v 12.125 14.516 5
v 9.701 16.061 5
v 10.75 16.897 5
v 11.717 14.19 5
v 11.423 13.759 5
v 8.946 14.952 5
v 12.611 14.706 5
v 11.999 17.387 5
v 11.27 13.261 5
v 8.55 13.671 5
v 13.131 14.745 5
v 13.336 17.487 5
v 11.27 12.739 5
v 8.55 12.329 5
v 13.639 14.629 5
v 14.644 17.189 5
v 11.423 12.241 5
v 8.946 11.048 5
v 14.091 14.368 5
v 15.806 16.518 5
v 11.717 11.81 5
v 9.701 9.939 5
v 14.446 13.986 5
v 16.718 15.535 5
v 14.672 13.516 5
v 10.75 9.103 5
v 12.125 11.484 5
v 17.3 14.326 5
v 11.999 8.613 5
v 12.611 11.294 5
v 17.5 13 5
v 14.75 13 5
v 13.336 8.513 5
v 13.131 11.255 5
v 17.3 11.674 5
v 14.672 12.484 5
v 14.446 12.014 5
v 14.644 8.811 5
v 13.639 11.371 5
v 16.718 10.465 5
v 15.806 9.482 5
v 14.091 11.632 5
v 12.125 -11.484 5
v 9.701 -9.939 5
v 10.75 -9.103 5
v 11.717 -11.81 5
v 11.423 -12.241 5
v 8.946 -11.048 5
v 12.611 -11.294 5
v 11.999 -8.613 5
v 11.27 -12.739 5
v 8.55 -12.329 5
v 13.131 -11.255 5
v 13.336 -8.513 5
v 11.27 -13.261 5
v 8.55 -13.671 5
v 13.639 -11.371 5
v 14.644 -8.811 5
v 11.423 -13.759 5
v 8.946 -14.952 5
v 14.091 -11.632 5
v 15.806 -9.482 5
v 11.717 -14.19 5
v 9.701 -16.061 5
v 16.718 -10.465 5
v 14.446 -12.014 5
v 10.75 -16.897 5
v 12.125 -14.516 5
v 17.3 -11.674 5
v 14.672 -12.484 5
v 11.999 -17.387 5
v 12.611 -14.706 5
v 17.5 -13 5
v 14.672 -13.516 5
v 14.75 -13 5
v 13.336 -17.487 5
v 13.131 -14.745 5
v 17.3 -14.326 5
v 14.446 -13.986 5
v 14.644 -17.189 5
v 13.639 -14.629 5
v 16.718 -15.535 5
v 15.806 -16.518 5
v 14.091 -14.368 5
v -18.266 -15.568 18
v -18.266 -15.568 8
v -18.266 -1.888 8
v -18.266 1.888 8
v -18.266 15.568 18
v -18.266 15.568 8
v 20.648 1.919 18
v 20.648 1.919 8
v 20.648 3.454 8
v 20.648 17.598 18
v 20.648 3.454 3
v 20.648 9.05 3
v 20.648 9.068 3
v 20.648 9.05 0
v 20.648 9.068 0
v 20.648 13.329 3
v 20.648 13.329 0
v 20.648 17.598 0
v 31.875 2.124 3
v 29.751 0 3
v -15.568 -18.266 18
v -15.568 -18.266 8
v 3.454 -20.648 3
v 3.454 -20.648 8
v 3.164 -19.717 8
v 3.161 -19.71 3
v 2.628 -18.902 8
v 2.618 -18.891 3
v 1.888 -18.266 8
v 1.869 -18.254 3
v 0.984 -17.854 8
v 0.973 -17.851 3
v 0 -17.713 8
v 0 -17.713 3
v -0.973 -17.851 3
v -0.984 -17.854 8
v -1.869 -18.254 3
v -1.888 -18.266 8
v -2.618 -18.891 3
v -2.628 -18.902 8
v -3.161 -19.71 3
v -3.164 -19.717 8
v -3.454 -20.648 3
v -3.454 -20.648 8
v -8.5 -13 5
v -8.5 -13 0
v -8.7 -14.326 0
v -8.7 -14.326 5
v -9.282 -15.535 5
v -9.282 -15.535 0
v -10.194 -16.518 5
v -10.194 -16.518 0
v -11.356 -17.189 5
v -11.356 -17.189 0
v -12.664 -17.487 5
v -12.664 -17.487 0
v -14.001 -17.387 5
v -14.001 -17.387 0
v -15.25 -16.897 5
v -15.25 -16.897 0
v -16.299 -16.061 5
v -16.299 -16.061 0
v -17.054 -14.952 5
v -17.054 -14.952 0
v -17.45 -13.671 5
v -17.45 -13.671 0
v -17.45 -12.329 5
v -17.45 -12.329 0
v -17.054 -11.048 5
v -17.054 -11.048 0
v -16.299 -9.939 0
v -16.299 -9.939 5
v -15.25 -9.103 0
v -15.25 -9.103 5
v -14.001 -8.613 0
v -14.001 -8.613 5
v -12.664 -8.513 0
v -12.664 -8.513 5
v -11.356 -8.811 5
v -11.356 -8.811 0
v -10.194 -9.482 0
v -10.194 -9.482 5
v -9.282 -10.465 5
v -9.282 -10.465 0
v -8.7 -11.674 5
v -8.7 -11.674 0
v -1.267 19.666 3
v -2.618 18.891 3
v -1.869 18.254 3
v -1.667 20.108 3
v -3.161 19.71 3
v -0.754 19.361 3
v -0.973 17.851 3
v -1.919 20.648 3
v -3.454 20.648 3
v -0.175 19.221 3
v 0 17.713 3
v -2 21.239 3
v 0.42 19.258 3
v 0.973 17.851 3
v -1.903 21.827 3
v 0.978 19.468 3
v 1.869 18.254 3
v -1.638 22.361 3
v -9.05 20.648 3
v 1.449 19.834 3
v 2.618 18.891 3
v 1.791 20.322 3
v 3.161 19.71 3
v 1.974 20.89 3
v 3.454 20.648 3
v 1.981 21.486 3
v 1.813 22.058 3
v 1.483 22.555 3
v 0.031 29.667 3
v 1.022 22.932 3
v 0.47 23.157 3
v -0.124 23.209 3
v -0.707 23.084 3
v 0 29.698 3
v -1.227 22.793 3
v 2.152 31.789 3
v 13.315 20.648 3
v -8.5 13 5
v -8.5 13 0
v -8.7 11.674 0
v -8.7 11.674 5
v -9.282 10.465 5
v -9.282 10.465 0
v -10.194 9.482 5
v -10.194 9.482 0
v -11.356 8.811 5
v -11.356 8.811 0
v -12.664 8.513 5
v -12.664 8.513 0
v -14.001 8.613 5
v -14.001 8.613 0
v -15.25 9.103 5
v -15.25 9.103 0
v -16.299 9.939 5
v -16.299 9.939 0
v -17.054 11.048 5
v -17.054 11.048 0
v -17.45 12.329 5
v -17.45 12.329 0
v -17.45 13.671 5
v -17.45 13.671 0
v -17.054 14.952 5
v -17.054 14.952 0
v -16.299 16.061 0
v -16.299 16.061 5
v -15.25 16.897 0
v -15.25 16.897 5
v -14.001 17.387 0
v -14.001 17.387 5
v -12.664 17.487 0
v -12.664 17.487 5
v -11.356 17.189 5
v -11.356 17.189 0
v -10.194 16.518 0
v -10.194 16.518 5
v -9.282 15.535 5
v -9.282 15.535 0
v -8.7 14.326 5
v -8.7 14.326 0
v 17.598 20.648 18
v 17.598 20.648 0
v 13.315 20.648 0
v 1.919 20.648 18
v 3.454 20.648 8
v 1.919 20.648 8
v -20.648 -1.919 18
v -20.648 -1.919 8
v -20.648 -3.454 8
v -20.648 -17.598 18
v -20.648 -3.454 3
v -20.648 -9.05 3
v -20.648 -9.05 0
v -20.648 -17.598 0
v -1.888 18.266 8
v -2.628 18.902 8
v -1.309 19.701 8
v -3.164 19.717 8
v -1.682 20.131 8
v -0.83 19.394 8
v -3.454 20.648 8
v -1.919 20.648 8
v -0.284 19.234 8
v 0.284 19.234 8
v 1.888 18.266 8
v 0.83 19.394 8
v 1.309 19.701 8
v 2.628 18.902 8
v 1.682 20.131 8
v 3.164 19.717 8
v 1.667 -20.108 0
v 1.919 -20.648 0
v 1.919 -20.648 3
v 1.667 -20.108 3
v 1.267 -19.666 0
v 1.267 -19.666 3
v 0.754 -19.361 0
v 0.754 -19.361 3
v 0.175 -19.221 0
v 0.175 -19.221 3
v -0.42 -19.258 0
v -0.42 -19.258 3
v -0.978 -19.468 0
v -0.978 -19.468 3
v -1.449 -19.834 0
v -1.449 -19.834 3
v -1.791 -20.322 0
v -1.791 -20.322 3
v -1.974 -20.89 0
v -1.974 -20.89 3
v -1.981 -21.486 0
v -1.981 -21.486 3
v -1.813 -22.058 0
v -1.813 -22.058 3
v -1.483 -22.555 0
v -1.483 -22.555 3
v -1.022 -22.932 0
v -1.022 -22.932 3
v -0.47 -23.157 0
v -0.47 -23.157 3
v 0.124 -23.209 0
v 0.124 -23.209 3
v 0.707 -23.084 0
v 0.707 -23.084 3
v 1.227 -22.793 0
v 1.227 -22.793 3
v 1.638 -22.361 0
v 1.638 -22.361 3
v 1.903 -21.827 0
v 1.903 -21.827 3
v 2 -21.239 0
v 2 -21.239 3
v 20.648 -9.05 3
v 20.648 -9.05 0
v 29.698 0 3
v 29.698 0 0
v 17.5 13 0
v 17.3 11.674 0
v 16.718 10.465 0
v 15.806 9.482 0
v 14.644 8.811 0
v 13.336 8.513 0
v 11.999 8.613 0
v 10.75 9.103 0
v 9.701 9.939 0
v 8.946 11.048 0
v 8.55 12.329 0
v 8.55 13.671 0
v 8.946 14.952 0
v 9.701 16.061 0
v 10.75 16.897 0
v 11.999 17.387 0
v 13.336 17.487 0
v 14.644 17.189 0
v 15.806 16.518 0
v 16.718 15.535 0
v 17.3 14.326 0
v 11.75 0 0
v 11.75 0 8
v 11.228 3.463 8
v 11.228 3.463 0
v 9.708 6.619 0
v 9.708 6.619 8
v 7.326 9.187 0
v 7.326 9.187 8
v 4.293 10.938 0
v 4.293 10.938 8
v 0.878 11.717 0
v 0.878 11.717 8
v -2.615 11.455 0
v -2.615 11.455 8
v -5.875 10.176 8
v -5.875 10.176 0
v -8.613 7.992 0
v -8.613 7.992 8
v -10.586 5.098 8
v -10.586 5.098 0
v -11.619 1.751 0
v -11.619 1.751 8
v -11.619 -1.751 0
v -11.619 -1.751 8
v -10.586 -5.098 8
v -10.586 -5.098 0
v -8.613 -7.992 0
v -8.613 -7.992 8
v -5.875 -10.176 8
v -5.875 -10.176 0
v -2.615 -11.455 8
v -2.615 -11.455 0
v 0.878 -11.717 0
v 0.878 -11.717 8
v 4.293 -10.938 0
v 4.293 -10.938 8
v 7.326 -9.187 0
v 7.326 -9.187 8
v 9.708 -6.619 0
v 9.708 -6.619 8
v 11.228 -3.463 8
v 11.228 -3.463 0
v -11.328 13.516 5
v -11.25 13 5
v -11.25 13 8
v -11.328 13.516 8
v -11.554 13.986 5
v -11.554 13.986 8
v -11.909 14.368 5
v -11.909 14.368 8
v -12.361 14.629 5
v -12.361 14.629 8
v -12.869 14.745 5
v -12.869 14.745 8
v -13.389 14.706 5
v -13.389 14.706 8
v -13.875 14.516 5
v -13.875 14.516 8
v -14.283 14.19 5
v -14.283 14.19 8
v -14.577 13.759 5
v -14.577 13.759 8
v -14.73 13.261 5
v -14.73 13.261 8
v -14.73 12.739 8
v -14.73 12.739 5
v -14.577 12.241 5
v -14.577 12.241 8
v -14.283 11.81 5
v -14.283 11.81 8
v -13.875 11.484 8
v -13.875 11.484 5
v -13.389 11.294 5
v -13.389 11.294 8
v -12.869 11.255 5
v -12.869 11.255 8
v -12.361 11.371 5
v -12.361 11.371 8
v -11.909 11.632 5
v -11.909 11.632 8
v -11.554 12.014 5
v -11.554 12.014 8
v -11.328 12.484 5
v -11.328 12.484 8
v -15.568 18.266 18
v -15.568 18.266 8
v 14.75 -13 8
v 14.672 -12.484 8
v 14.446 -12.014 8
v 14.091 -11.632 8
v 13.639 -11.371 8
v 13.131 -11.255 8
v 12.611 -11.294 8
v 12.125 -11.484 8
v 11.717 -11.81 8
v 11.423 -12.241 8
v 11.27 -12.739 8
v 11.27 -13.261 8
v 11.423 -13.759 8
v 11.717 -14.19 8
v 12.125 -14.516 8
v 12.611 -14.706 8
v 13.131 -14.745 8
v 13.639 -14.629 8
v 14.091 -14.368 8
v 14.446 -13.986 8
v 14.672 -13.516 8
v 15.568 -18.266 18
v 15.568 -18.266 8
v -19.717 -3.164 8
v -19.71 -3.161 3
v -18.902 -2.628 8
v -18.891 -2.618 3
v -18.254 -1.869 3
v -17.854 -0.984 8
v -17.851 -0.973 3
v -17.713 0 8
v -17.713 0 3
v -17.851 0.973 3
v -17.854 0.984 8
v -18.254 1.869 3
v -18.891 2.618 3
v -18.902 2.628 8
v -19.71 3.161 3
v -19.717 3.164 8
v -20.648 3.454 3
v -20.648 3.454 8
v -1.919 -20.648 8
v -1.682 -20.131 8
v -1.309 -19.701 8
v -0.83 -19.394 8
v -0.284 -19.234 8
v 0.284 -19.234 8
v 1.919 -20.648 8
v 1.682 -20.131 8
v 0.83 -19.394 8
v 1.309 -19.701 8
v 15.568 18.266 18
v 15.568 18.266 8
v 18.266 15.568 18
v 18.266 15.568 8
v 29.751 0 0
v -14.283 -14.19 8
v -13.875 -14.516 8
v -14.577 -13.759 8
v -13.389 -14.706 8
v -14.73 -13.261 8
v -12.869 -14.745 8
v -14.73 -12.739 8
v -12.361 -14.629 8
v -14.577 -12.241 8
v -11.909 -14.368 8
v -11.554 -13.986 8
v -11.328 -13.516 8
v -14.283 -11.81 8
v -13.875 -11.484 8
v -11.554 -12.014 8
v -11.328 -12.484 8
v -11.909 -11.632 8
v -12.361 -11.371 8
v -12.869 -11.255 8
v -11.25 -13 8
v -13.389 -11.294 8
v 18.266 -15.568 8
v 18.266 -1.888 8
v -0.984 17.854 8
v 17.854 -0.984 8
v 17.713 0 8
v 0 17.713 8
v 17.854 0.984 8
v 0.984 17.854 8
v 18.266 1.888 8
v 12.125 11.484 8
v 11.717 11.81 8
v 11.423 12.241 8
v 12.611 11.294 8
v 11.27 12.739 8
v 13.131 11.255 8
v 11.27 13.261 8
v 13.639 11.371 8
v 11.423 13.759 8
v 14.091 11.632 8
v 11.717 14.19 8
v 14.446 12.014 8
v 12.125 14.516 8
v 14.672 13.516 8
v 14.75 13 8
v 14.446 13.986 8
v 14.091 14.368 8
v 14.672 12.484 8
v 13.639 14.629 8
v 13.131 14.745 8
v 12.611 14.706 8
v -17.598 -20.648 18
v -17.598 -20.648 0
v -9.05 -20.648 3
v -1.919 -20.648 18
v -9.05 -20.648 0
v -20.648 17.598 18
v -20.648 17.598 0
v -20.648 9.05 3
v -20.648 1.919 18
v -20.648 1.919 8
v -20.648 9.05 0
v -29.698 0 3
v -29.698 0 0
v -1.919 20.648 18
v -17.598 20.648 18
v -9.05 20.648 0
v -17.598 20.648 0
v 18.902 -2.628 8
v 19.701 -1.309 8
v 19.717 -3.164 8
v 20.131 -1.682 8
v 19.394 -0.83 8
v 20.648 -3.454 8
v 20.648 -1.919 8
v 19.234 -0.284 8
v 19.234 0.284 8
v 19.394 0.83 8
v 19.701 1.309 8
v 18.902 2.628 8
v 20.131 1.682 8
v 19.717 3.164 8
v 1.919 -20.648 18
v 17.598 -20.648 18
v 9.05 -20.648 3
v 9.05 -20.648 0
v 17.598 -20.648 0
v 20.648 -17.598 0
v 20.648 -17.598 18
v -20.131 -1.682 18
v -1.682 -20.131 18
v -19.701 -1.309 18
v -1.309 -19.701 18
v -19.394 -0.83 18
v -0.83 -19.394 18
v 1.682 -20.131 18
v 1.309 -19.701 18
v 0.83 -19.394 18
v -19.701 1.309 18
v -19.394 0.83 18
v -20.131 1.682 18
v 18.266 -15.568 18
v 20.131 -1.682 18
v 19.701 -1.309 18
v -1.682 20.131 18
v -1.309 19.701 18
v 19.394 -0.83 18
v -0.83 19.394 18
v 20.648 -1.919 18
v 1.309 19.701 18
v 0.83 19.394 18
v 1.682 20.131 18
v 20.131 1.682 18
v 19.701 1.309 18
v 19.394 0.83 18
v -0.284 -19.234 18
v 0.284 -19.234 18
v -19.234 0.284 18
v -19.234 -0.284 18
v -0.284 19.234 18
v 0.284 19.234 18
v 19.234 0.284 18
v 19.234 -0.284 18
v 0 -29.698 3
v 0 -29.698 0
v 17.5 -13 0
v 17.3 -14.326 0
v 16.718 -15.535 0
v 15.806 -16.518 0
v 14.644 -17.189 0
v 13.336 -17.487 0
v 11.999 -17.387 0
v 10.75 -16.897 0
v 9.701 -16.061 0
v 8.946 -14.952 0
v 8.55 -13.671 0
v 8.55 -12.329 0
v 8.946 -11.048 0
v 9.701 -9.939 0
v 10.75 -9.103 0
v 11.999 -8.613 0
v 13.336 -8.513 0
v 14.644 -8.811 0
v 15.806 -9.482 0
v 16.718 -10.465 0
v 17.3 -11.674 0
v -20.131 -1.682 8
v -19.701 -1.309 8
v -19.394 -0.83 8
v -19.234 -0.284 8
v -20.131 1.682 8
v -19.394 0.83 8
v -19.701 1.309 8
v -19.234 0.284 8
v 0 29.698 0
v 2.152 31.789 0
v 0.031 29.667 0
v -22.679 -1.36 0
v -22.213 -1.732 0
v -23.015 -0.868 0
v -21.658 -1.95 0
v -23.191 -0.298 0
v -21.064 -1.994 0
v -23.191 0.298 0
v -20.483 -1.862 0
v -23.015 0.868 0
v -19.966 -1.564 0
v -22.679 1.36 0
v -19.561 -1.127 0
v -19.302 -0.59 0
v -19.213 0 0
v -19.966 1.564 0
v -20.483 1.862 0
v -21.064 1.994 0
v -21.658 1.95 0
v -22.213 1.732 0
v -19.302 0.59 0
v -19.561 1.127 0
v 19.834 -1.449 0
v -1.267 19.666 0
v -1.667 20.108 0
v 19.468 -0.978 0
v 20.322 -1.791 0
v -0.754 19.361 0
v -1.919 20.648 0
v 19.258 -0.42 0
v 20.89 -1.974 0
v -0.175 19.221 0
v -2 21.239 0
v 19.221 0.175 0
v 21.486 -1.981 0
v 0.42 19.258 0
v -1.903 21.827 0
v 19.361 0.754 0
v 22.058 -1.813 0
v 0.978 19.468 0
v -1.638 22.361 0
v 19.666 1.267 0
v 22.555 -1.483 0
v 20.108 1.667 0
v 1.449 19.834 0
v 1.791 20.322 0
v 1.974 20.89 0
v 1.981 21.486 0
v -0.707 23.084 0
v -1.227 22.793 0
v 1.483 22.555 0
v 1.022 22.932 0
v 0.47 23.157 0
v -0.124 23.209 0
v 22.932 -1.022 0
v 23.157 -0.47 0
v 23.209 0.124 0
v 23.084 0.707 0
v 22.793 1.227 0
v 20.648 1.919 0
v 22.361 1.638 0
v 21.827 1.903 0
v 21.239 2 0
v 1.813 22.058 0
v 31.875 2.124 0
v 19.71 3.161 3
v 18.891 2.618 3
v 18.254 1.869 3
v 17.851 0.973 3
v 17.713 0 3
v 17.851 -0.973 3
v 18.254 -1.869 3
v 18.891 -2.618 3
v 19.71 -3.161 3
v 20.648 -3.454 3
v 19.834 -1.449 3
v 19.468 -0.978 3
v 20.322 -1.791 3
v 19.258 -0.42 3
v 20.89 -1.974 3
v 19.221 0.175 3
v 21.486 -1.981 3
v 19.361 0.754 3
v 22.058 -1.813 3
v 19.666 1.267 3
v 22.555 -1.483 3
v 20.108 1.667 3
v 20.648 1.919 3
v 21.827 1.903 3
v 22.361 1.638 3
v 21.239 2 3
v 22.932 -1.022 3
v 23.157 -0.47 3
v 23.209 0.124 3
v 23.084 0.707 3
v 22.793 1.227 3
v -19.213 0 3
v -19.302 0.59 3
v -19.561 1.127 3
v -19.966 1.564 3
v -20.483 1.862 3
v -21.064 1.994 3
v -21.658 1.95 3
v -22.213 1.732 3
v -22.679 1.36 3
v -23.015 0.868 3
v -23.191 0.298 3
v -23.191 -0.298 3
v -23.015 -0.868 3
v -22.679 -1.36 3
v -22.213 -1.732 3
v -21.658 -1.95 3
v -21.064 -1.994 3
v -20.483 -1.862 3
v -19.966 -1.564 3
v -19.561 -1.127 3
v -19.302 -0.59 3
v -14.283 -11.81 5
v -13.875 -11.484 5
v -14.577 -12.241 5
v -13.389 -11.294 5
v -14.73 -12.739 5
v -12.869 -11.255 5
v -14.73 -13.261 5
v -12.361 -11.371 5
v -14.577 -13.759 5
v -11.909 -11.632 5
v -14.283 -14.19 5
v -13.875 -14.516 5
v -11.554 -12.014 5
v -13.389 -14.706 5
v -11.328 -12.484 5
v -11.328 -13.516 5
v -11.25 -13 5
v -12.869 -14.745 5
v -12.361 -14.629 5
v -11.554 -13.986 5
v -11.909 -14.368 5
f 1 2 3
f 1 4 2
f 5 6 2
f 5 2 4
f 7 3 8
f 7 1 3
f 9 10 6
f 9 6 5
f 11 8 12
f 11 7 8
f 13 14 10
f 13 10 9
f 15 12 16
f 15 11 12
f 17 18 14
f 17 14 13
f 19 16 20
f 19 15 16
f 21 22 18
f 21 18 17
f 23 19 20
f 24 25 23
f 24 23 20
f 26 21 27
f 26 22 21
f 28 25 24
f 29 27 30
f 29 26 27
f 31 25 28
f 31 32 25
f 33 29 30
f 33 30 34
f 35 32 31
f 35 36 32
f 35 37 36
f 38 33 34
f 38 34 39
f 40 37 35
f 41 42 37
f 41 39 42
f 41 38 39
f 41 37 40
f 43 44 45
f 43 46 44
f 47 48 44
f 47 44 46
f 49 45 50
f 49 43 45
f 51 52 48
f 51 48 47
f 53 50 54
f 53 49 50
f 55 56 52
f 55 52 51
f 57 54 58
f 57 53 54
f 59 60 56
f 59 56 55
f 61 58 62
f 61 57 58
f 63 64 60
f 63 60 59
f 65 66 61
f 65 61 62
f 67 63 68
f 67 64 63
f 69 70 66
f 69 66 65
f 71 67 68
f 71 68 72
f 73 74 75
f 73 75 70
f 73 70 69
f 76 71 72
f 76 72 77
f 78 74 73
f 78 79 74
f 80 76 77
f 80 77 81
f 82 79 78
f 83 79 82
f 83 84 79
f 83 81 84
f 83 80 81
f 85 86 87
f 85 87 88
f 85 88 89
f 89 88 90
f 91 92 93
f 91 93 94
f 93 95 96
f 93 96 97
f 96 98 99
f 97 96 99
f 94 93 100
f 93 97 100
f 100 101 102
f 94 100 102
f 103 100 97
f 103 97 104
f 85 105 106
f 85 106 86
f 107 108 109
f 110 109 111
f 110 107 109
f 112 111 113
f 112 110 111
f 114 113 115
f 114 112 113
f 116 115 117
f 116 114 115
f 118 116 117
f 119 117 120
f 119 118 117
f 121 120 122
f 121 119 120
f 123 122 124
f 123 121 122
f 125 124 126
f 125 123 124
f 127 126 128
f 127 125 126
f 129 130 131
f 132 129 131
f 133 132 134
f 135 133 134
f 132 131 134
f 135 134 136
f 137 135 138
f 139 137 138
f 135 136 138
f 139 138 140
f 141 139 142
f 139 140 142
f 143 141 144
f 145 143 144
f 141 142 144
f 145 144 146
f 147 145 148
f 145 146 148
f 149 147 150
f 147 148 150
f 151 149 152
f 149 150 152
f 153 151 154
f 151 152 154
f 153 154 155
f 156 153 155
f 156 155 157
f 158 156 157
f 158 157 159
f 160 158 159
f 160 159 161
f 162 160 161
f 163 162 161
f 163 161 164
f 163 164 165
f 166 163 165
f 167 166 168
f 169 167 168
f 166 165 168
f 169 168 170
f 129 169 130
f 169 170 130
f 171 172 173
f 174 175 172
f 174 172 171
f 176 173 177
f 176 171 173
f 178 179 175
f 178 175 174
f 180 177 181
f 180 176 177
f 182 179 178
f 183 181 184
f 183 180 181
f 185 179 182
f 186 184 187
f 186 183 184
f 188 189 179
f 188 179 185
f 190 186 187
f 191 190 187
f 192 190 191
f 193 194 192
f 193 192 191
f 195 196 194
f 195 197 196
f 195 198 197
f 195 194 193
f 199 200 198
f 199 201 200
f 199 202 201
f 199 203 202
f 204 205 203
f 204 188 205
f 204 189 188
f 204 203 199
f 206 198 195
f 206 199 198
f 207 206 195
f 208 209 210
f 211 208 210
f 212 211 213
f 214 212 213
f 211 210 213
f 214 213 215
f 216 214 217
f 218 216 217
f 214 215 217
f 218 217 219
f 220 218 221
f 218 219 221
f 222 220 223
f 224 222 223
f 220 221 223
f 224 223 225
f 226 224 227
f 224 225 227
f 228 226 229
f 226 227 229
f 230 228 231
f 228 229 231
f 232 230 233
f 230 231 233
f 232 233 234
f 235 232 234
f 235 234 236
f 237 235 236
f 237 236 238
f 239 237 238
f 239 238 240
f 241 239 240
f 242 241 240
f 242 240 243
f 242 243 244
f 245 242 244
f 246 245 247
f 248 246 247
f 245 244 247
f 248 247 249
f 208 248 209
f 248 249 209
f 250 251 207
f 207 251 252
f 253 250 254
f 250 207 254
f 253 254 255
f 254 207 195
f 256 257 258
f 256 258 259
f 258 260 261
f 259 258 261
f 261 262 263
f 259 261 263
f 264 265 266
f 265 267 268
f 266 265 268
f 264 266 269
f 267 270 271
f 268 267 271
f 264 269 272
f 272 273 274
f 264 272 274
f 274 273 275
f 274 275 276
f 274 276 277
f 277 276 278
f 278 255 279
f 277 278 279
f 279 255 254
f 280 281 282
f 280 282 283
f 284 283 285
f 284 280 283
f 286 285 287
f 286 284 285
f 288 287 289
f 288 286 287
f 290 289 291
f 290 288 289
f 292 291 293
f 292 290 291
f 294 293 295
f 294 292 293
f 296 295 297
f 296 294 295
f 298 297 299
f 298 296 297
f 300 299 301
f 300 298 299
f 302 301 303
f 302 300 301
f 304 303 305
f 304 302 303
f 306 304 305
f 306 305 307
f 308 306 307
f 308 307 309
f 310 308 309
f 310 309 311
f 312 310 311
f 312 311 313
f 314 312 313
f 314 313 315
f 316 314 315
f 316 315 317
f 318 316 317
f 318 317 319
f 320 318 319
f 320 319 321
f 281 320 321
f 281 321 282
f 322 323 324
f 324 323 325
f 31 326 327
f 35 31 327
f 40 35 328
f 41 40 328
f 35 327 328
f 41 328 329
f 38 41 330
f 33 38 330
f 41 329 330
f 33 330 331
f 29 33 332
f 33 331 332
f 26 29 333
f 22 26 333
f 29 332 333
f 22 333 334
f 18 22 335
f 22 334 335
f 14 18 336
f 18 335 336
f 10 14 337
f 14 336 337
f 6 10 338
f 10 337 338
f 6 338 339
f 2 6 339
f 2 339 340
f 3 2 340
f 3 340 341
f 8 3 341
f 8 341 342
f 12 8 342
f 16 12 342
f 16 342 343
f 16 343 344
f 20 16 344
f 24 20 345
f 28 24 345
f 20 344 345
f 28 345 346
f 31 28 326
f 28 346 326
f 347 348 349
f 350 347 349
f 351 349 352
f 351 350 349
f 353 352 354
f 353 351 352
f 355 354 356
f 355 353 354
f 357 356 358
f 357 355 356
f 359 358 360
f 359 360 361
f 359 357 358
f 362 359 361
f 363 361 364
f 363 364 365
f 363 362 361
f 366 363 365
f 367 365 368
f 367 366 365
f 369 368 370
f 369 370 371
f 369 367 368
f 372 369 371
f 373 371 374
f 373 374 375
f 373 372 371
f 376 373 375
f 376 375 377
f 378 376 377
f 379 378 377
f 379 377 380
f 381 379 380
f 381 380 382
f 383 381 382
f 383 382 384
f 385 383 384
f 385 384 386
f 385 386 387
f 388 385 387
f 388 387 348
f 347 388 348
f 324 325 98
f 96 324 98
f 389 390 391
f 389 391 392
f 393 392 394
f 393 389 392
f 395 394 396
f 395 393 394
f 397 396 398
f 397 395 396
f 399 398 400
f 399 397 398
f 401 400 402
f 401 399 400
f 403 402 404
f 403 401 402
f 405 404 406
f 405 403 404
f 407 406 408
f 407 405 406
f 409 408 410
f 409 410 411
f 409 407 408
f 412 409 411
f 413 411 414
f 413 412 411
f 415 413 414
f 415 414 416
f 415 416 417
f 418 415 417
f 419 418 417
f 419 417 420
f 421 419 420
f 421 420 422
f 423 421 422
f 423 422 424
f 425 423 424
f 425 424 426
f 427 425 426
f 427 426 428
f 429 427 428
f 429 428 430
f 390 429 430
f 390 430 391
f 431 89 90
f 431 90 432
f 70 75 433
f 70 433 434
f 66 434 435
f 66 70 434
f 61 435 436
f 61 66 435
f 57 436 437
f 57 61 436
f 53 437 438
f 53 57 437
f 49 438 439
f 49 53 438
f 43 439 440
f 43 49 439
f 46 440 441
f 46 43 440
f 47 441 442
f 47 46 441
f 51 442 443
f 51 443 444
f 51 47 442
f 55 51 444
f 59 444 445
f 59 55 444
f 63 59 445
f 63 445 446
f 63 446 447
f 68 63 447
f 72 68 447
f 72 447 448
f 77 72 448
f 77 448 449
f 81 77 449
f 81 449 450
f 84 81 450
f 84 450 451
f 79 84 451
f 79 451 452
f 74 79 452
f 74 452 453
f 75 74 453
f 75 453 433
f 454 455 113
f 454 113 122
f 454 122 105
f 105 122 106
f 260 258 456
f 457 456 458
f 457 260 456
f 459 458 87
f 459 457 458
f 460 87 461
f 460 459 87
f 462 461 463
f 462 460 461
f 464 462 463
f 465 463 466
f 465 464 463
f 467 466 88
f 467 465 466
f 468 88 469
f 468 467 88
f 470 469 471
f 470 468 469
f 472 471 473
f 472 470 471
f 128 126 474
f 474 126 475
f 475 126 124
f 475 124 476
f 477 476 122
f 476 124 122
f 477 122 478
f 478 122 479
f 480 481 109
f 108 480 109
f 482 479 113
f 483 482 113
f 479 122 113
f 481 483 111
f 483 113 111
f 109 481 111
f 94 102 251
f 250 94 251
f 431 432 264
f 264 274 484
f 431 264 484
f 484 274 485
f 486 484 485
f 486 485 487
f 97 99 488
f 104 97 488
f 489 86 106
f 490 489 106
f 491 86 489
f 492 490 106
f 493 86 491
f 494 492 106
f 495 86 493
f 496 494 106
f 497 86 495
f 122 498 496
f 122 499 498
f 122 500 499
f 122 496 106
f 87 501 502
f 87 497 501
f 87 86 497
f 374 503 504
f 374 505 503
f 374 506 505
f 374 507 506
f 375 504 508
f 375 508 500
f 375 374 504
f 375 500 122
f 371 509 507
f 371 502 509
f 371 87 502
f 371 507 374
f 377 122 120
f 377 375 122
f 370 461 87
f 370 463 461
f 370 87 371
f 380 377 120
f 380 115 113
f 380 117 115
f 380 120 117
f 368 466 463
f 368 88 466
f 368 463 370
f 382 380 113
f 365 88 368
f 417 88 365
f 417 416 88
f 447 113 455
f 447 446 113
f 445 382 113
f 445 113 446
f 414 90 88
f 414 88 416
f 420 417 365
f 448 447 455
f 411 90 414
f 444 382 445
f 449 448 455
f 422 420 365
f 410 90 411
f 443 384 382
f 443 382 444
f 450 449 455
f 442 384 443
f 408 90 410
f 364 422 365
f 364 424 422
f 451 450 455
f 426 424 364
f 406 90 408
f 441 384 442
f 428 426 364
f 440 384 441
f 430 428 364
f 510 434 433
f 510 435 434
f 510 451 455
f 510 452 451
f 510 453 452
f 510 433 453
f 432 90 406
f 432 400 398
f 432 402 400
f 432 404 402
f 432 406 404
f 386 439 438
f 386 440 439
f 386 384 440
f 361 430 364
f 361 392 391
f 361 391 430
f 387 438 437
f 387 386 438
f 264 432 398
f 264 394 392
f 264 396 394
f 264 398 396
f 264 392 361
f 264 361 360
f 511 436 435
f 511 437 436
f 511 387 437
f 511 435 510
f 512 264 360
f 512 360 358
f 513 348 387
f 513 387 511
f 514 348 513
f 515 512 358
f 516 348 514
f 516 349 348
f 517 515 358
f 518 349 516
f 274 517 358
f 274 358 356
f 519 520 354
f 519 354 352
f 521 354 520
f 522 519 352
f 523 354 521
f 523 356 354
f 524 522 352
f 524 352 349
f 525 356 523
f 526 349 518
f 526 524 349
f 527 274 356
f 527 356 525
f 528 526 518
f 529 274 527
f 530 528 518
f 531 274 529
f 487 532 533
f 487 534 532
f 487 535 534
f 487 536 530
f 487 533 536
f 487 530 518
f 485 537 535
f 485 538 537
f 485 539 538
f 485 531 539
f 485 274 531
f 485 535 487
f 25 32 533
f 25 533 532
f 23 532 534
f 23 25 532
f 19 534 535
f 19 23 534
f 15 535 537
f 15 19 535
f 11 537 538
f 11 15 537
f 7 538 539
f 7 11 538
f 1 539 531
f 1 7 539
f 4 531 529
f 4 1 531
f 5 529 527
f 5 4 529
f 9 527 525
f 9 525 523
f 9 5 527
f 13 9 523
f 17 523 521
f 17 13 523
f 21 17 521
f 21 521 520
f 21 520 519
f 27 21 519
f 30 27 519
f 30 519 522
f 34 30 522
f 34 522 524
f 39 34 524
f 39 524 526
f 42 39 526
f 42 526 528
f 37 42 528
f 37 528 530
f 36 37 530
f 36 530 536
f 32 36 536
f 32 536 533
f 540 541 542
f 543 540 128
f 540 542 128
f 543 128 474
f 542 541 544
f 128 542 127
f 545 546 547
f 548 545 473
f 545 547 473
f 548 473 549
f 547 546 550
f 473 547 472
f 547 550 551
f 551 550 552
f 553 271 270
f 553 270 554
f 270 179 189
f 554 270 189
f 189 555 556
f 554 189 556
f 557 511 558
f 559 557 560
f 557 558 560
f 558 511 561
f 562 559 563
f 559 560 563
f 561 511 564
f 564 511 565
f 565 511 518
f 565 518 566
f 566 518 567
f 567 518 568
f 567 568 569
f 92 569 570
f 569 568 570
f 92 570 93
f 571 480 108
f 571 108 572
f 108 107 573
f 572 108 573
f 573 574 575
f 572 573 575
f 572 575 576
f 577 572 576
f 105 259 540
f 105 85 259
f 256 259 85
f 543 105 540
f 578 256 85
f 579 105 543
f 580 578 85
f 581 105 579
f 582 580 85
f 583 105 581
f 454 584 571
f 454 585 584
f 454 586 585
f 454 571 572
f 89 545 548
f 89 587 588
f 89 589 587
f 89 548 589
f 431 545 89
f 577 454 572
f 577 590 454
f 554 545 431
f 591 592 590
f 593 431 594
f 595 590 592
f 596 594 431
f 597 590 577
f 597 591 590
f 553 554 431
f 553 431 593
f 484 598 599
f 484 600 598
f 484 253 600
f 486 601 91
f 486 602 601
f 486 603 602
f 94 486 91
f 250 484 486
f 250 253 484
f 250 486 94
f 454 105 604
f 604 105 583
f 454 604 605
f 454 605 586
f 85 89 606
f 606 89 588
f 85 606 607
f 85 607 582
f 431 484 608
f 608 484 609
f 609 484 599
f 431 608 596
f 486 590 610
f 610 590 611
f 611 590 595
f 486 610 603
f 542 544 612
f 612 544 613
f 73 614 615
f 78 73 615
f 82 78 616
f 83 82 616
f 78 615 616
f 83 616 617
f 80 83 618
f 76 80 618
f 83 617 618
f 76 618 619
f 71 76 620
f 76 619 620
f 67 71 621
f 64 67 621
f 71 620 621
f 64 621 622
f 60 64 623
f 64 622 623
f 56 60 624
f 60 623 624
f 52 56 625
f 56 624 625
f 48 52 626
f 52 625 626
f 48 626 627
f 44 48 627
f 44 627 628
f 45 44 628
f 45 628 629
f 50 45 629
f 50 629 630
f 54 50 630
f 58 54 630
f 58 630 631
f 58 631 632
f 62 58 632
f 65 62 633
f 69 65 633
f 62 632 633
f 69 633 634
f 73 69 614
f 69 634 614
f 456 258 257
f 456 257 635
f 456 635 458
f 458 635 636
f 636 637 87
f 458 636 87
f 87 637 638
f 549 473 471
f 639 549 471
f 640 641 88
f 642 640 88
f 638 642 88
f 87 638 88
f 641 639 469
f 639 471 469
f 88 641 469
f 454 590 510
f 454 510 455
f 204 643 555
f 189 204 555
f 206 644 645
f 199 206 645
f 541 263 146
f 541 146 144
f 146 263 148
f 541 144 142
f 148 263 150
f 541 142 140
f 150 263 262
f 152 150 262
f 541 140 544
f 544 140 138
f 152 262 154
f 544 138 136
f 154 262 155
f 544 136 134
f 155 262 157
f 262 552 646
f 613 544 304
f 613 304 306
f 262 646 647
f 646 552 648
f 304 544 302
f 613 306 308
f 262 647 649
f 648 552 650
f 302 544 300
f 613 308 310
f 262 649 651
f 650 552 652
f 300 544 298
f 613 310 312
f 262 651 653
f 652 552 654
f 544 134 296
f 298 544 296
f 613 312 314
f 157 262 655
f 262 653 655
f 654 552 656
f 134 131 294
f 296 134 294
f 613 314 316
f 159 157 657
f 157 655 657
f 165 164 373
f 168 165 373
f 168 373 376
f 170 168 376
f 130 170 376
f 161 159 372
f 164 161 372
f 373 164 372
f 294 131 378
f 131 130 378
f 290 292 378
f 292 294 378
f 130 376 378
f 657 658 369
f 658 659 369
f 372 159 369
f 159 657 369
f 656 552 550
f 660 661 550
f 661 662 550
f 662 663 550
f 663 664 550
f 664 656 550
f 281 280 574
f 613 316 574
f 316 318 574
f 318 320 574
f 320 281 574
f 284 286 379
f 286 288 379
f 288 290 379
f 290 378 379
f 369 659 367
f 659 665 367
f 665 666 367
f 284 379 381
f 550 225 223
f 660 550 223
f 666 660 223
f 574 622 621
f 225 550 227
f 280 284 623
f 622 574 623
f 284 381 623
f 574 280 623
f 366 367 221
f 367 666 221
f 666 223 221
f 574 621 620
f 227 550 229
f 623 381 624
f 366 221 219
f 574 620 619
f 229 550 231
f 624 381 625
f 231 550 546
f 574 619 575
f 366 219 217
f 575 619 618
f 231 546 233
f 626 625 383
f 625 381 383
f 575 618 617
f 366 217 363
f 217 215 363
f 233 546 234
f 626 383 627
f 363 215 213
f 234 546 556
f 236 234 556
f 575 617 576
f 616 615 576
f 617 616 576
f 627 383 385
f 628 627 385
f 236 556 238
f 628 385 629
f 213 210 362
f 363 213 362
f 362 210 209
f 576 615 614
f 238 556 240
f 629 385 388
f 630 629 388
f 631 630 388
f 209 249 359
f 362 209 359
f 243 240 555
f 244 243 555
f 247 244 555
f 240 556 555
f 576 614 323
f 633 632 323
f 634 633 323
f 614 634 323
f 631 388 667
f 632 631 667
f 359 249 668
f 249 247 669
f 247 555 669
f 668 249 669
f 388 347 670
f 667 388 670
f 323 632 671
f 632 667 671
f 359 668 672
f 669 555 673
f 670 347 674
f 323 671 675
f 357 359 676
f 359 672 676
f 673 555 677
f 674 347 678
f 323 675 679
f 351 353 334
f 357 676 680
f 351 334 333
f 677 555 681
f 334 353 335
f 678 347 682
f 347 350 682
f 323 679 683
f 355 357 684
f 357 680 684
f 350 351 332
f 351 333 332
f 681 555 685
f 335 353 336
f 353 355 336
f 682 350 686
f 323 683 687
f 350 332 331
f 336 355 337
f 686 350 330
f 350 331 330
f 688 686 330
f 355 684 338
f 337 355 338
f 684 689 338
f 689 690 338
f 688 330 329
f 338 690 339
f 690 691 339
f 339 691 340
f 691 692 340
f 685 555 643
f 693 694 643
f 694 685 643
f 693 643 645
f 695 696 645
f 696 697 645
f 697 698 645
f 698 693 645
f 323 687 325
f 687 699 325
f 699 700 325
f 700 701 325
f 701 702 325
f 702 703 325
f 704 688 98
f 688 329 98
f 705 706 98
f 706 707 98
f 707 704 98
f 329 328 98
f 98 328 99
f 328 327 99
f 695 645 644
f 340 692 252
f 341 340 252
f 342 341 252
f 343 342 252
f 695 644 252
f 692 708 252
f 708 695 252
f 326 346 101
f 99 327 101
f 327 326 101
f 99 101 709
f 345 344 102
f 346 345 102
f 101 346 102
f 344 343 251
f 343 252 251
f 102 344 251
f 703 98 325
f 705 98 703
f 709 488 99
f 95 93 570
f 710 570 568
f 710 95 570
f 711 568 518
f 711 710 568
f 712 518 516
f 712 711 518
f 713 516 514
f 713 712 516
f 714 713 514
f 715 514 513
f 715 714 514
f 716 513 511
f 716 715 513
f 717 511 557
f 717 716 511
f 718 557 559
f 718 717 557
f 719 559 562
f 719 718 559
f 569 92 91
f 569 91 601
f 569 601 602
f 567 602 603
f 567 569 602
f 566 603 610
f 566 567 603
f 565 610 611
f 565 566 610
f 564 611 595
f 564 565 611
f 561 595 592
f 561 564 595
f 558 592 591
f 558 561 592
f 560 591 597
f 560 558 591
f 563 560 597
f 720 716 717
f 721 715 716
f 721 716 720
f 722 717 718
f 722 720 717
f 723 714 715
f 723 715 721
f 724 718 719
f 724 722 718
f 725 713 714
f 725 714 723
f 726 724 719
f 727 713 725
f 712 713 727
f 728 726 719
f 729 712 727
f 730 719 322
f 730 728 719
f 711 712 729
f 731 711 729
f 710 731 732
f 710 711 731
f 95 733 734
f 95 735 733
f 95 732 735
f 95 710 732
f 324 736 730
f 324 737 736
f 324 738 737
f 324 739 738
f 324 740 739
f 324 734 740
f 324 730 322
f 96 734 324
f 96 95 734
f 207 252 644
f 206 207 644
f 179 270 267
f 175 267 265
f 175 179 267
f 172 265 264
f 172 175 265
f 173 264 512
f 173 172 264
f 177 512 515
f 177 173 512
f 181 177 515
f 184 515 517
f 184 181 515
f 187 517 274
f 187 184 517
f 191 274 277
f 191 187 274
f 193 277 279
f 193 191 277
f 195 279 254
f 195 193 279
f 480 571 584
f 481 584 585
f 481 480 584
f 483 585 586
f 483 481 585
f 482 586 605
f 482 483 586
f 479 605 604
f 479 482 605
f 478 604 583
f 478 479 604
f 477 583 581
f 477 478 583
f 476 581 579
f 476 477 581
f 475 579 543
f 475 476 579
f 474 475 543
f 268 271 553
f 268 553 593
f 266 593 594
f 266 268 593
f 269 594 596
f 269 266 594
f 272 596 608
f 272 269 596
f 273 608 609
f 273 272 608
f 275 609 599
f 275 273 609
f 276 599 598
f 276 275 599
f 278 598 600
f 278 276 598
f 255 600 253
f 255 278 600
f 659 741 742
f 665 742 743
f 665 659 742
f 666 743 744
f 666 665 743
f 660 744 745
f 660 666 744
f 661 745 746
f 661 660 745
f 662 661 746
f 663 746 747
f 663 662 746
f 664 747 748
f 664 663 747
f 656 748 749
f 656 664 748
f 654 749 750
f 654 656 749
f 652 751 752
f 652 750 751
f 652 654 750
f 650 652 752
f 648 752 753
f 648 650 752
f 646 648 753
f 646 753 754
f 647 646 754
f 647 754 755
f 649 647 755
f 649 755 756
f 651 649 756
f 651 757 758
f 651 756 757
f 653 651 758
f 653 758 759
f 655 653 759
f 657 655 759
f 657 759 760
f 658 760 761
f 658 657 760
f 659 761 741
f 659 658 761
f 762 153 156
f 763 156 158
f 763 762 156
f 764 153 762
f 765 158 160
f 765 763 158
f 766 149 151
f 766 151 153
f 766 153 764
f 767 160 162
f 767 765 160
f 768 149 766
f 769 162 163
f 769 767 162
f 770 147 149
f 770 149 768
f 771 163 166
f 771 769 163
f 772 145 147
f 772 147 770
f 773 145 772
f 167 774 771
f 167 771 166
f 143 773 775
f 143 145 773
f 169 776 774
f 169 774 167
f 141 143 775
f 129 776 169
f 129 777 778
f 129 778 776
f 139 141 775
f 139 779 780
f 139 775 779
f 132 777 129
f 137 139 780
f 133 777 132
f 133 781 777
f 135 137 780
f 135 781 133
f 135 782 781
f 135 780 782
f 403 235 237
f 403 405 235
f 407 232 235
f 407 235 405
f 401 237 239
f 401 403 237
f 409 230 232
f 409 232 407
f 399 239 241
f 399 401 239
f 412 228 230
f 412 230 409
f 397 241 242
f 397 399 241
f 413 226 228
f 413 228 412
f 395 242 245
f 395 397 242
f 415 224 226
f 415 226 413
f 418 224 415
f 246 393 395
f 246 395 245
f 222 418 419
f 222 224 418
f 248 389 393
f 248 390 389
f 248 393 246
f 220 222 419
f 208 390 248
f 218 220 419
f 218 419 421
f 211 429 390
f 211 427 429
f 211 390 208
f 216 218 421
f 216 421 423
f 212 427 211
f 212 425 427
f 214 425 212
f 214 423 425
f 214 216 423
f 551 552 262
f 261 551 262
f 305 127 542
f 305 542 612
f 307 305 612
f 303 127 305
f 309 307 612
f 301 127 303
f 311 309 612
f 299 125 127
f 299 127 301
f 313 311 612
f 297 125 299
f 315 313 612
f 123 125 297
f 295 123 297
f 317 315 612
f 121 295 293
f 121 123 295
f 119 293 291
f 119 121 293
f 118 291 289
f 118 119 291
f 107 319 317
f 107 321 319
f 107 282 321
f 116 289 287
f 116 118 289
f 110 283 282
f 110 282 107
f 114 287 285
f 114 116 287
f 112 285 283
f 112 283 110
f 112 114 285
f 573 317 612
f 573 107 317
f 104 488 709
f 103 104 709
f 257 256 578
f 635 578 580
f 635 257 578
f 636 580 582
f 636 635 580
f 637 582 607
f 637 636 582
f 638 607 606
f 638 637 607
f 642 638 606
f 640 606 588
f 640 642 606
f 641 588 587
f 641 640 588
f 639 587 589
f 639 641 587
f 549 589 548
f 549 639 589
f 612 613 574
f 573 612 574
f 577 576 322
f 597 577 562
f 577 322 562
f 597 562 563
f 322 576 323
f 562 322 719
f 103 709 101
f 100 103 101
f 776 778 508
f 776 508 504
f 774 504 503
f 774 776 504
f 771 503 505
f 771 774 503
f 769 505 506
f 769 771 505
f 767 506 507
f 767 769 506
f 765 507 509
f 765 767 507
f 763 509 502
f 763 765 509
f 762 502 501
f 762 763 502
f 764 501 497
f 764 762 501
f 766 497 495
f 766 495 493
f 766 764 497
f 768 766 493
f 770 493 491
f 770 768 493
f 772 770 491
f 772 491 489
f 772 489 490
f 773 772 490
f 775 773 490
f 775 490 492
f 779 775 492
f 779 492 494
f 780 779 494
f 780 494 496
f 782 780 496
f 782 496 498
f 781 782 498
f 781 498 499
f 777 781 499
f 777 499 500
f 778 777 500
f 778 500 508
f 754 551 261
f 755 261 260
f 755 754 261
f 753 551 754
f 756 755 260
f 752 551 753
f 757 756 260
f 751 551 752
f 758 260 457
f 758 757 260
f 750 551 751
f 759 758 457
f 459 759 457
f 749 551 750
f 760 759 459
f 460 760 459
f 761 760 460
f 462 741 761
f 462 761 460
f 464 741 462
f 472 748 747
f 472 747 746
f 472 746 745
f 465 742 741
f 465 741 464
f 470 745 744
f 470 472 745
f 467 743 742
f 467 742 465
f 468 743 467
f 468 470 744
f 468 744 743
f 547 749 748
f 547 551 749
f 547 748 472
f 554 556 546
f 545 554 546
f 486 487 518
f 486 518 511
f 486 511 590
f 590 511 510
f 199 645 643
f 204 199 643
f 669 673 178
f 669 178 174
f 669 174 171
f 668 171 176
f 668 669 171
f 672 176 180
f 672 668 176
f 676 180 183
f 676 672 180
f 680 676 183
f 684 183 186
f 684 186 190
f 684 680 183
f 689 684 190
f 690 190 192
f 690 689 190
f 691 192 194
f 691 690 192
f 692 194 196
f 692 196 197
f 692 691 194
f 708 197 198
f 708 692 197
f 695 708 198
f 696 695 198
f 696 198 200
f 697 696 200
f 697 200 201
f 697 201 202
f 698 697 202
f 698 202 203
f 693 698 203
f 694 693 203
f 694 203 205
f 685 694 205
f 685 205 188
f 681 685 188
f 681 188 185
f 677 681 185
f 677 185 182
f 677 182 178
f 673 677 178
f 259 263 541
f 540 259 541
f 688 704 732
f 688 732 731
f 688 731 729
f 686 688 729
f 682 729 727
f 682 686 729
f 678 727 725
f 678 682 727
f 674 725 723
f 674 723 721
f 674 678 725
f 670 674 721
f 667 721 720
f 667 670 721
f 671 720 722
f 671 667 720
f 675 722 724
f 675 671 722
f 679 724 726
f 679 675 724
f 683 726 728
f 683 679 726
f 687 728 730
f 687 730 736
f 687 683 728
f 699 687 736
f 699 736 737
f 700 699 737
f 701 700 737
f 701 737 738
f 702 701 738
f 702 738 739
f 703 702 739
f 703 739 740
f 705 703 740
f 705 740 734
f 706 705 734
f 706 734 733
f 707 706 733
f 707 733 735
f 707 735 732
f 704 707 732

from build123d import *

# Parameters (mm, degrees)
F4_DEPTH  = 18
F2_R      = 1.75
F2_R_2    = 11.75
F5_DEPTH  = 8
F3_R      = 2
F3_R_2    = 1.75
F3_R_3    = 11.75
F6_DEPTH  = 3
F7_DEPTH  = 18
F8_R      = 4.5
F8_R_2    = 1.75
F9_DEPTH  = 5
F10_DEPTH = 5
F11_R     = 3.5
F12_DEPTH = 5
F14_DEPTH = 3
F15_DEPTH = 5
F16_DEPTH = 5
F17_R     = 1.75
F18_DEPTH = 5


with BuildPart() as f4:
    # F1 (on Top) → F4 (new body)
    with BuildSketch(Plane.XY):
        Polygon((-17.5979303911, 20.6482383256), (-20.6482383256, 17.5979303911), (-20.6482383256, -17.5979303911), (-17.5979303911, -20.6482383256), (17.5979303911, -20.6482383256), (20.6482383256, -17.5979303911), (20.6482383256, 17.5979303911), (17.5979303911, 20.6482383256), align=None)
        Polygon((-15.5676494429, -18.266042013), (-18.266042013, -15.5676494429), (-18.266042013, 15.5676494429), (-15.5676494429, 18.266042013), (15.5676494429, 18.266042013), (18.266042013, 15.5676494429), (18.266042013, -15.5676494429), (15.5676494429, -18.266042013), align=None, mode=Mode.SUBTRACT)
    extrude(amount=F4_DEPTH)

    # F2 (on Top) → F5 (join)
    with BuildSketch(Plane.XY):
        Polygon((-15.5676494429, 18.266042013), (-18.266042013, 15.5676494429), (-18.266042013, -15.5676494429), (-15.5676494429, -18.266042013), (15.5676494429, -18.266042013), (18.266042013, -15.5676494429), (18.266042013, 15.5676494429), (15.5676494429, 18.266042013), align=None)
        with Locations((-13, -13)):
            Circle(F2_R, mode=Mode.SUBTRACT)
        with Locations((13, -13)):
            Circle(F2_R, mode=Mode.SUBTRACT)
        with Locations((-13, 13)):
            Circle(F2_R, mode=Mode.SUBTRACT)
        Circle(F2_R_2, mode=Mode.SUBTRACT)
        with Locations((13, 13)):
            Circle(F2_R, mode=Mode.SUBTRACT)
    extrude(amount=F5_DEPTH)

    # F3 (on Top) → F6 (join)
    with BuildSketch(Plane.XY):
        Polygon((-29.6984848098, 0), (0, -29.6984848098), (29.6984848098, 0), (0, 29.6984848098), align=None)
        with Locations((0, -21.2132034356)):
            Circle(F3_R, mode=Mode.SUBTRACT)
        with Locations((-13, -13)):
            Circle(F3_R_2, mode=Mode.SUBTRACT)
        with Locations((13, -13)):
            Circle(F3_R_2, mode=Mode.SUBTRACT)
        with Locations((-21.2132034356, 0)):
            Circle(F3_R, mode=Mode.SUBTRACT)
        Circle(F3_R_3, mode=Mode.SUBTRACT)
        with Locations((-13, 13)):
            Circle(F3_R_2, mode=Mode.SUBTRACT)
        with Locations((0, 21.2132034356)):
            Circle(F3_R, mode=Mode.SUBTRACT)
        with Locations((13, 13)):
            Circle(F3_R_2, mode=Mode.SUBTRACT)
        with Locations((21.2132034356, 0)):
            Circle(F3_R, mode=Mode.SUBTRACT)
    extrude(amount=F6_DEPTH)

    # F3 (on Top) → F7 (cut)
    with BuildSketch(Plane.XY):
        with Locations((21.2132034356, 0)):
            Circle(F3_R)
        with Locations((0, 21.2132034356)):
            Circle(F3_R)
        with Locations((0, -21.2132034356)):
            Circle(F3_R)
        with Locations((-21.2132034356, 0)):
            Circle(F3_R)
    extrude(amount=F7_DEPTH, mode=Mode.SUBTRACT)

    # F8 (on face) + F2 (on Top) → F9 (cut)
    with BuildSketch(Plane(origin=(0, 0, 0), x_dir=(1, 0, 0), z_dir=(0, 0, -1))):
        with Locations((-13, -13)):
            Circle(F8_R)
        with Locations((-13, -13)):
            Circle(F8_R_2, mode=Mode.SUBTRACT)
    with BuildSketch(Plane.XY):
        with Locations((-13, 13)):
            Circle(F2_R)
    extrude(amount=-F9_DEPTH, dir=(0, 0, -1), mode=Mode.SUBTRACT)

    # F8 (on face) + F2 (on Top) → F10 (cut)
    with BuildSketch(Plane(origin=(0, 0, 0), x_dir=(1, 0, 0), z_dir=(0, 0, -1))):
        with Locations((13, 13)):
            Circle(F8_R)
        with Locations((13, 13)):
            Circle(F8_R_2, mode=Mode.SUBTRACT)
    with BuildSketch(Plane.XY):
        with Locations((13, -13)):
            Circle(F2_R)
    extrude(amount=-F10_DEPTH, dir=(0, 0, -1), mode=Mode.SUBTRACT)

    # F11 (on face) → F12 (cut)
    with BuildSketch(Plane.XY.offset(3)):
        with Locations((0, 21.2132034356)):
            Circle(F11_R)
        with Locations((0, -21.2132034356)):
            Circle(F11_R)
        with Locations((21.2132034356, 0)):
            Circle(F11_R)
        with Locations((-21.2132034356, 0)):
            Circle(F11_R)
    extrude(amount=F12_DEPTH, mode=Mode.SUBTRACT)

    # F13 (on face) → F14 (join)
    with BuildSketch(Plane.XY):
        Polygon((13.4627325878, 20.5004686409), (2.1524152157, 31.7889230696), (0.030988478, 29.6674963319), (9.1980161689, 20.5004686409), align=None)
        Polygon((31.875104401, 2.1236881052), (20.4795914376, 13.4971734413), (20.4795914376, 9.2360144303), (29.7514162958, 0), align=None)
    extrude(amount=F14_DEPTH)

    # F8 (on face) → F15 (cut)
    with BuildSketch(Plane(origin=(0, 0, 0), x_dir=(1, 0, 0), z_dir=(0, 0, -1))):
        with Locations((13, -13)):
            Circle(F8_R)
        with Locations((13, -13)):
            Circle(F8_R_2, mode=Mode.SUBTRACT)
    extrude(amount=-F15_DEPTH, mode=Mode.SUBTRACT)

    # F8 (on face) → F16 (cut)
    with BuildSketch(Plane(origin=(0, 0, 0), x_dir=(1, 0, 0), z_dir=(0, 0, -1))):
        with Locations((-13, 13)):
            Circle(F8_R)
        with Locations((-13, 13)):
            Circle(F8_R_2, mode=Mode.SUBTRACT)
    extrude(amount=-F16_DEPTH, mode=Mode.SUBTRACT)

    # F17 (on face) → F18 (cut)
    with BuildSketch(Plane(origin=(19.1230843583, 19.1230843583, 0), x_dir=(-0.7071067812, 0.7071067812, 0), z_dir=(0.7071067812, 0.7071067812, 0))):
        with Locations((33.1568941474, 3.2000013161)):
            Circle(F17_R)
        with Locations((33.1568941474, 16.7999986839)):
            Circle(F17_R)
        with Locations((-33.1568941474, 16.7999986839)):
            Circle(F17_R)
        with Locations((-33.1568941474, 3.2000013161)):
            Circle(F17_R)
    extrude(amount=-F18_DEPTH, mode=Mode.SUBTRACT)


solid = f4.part
